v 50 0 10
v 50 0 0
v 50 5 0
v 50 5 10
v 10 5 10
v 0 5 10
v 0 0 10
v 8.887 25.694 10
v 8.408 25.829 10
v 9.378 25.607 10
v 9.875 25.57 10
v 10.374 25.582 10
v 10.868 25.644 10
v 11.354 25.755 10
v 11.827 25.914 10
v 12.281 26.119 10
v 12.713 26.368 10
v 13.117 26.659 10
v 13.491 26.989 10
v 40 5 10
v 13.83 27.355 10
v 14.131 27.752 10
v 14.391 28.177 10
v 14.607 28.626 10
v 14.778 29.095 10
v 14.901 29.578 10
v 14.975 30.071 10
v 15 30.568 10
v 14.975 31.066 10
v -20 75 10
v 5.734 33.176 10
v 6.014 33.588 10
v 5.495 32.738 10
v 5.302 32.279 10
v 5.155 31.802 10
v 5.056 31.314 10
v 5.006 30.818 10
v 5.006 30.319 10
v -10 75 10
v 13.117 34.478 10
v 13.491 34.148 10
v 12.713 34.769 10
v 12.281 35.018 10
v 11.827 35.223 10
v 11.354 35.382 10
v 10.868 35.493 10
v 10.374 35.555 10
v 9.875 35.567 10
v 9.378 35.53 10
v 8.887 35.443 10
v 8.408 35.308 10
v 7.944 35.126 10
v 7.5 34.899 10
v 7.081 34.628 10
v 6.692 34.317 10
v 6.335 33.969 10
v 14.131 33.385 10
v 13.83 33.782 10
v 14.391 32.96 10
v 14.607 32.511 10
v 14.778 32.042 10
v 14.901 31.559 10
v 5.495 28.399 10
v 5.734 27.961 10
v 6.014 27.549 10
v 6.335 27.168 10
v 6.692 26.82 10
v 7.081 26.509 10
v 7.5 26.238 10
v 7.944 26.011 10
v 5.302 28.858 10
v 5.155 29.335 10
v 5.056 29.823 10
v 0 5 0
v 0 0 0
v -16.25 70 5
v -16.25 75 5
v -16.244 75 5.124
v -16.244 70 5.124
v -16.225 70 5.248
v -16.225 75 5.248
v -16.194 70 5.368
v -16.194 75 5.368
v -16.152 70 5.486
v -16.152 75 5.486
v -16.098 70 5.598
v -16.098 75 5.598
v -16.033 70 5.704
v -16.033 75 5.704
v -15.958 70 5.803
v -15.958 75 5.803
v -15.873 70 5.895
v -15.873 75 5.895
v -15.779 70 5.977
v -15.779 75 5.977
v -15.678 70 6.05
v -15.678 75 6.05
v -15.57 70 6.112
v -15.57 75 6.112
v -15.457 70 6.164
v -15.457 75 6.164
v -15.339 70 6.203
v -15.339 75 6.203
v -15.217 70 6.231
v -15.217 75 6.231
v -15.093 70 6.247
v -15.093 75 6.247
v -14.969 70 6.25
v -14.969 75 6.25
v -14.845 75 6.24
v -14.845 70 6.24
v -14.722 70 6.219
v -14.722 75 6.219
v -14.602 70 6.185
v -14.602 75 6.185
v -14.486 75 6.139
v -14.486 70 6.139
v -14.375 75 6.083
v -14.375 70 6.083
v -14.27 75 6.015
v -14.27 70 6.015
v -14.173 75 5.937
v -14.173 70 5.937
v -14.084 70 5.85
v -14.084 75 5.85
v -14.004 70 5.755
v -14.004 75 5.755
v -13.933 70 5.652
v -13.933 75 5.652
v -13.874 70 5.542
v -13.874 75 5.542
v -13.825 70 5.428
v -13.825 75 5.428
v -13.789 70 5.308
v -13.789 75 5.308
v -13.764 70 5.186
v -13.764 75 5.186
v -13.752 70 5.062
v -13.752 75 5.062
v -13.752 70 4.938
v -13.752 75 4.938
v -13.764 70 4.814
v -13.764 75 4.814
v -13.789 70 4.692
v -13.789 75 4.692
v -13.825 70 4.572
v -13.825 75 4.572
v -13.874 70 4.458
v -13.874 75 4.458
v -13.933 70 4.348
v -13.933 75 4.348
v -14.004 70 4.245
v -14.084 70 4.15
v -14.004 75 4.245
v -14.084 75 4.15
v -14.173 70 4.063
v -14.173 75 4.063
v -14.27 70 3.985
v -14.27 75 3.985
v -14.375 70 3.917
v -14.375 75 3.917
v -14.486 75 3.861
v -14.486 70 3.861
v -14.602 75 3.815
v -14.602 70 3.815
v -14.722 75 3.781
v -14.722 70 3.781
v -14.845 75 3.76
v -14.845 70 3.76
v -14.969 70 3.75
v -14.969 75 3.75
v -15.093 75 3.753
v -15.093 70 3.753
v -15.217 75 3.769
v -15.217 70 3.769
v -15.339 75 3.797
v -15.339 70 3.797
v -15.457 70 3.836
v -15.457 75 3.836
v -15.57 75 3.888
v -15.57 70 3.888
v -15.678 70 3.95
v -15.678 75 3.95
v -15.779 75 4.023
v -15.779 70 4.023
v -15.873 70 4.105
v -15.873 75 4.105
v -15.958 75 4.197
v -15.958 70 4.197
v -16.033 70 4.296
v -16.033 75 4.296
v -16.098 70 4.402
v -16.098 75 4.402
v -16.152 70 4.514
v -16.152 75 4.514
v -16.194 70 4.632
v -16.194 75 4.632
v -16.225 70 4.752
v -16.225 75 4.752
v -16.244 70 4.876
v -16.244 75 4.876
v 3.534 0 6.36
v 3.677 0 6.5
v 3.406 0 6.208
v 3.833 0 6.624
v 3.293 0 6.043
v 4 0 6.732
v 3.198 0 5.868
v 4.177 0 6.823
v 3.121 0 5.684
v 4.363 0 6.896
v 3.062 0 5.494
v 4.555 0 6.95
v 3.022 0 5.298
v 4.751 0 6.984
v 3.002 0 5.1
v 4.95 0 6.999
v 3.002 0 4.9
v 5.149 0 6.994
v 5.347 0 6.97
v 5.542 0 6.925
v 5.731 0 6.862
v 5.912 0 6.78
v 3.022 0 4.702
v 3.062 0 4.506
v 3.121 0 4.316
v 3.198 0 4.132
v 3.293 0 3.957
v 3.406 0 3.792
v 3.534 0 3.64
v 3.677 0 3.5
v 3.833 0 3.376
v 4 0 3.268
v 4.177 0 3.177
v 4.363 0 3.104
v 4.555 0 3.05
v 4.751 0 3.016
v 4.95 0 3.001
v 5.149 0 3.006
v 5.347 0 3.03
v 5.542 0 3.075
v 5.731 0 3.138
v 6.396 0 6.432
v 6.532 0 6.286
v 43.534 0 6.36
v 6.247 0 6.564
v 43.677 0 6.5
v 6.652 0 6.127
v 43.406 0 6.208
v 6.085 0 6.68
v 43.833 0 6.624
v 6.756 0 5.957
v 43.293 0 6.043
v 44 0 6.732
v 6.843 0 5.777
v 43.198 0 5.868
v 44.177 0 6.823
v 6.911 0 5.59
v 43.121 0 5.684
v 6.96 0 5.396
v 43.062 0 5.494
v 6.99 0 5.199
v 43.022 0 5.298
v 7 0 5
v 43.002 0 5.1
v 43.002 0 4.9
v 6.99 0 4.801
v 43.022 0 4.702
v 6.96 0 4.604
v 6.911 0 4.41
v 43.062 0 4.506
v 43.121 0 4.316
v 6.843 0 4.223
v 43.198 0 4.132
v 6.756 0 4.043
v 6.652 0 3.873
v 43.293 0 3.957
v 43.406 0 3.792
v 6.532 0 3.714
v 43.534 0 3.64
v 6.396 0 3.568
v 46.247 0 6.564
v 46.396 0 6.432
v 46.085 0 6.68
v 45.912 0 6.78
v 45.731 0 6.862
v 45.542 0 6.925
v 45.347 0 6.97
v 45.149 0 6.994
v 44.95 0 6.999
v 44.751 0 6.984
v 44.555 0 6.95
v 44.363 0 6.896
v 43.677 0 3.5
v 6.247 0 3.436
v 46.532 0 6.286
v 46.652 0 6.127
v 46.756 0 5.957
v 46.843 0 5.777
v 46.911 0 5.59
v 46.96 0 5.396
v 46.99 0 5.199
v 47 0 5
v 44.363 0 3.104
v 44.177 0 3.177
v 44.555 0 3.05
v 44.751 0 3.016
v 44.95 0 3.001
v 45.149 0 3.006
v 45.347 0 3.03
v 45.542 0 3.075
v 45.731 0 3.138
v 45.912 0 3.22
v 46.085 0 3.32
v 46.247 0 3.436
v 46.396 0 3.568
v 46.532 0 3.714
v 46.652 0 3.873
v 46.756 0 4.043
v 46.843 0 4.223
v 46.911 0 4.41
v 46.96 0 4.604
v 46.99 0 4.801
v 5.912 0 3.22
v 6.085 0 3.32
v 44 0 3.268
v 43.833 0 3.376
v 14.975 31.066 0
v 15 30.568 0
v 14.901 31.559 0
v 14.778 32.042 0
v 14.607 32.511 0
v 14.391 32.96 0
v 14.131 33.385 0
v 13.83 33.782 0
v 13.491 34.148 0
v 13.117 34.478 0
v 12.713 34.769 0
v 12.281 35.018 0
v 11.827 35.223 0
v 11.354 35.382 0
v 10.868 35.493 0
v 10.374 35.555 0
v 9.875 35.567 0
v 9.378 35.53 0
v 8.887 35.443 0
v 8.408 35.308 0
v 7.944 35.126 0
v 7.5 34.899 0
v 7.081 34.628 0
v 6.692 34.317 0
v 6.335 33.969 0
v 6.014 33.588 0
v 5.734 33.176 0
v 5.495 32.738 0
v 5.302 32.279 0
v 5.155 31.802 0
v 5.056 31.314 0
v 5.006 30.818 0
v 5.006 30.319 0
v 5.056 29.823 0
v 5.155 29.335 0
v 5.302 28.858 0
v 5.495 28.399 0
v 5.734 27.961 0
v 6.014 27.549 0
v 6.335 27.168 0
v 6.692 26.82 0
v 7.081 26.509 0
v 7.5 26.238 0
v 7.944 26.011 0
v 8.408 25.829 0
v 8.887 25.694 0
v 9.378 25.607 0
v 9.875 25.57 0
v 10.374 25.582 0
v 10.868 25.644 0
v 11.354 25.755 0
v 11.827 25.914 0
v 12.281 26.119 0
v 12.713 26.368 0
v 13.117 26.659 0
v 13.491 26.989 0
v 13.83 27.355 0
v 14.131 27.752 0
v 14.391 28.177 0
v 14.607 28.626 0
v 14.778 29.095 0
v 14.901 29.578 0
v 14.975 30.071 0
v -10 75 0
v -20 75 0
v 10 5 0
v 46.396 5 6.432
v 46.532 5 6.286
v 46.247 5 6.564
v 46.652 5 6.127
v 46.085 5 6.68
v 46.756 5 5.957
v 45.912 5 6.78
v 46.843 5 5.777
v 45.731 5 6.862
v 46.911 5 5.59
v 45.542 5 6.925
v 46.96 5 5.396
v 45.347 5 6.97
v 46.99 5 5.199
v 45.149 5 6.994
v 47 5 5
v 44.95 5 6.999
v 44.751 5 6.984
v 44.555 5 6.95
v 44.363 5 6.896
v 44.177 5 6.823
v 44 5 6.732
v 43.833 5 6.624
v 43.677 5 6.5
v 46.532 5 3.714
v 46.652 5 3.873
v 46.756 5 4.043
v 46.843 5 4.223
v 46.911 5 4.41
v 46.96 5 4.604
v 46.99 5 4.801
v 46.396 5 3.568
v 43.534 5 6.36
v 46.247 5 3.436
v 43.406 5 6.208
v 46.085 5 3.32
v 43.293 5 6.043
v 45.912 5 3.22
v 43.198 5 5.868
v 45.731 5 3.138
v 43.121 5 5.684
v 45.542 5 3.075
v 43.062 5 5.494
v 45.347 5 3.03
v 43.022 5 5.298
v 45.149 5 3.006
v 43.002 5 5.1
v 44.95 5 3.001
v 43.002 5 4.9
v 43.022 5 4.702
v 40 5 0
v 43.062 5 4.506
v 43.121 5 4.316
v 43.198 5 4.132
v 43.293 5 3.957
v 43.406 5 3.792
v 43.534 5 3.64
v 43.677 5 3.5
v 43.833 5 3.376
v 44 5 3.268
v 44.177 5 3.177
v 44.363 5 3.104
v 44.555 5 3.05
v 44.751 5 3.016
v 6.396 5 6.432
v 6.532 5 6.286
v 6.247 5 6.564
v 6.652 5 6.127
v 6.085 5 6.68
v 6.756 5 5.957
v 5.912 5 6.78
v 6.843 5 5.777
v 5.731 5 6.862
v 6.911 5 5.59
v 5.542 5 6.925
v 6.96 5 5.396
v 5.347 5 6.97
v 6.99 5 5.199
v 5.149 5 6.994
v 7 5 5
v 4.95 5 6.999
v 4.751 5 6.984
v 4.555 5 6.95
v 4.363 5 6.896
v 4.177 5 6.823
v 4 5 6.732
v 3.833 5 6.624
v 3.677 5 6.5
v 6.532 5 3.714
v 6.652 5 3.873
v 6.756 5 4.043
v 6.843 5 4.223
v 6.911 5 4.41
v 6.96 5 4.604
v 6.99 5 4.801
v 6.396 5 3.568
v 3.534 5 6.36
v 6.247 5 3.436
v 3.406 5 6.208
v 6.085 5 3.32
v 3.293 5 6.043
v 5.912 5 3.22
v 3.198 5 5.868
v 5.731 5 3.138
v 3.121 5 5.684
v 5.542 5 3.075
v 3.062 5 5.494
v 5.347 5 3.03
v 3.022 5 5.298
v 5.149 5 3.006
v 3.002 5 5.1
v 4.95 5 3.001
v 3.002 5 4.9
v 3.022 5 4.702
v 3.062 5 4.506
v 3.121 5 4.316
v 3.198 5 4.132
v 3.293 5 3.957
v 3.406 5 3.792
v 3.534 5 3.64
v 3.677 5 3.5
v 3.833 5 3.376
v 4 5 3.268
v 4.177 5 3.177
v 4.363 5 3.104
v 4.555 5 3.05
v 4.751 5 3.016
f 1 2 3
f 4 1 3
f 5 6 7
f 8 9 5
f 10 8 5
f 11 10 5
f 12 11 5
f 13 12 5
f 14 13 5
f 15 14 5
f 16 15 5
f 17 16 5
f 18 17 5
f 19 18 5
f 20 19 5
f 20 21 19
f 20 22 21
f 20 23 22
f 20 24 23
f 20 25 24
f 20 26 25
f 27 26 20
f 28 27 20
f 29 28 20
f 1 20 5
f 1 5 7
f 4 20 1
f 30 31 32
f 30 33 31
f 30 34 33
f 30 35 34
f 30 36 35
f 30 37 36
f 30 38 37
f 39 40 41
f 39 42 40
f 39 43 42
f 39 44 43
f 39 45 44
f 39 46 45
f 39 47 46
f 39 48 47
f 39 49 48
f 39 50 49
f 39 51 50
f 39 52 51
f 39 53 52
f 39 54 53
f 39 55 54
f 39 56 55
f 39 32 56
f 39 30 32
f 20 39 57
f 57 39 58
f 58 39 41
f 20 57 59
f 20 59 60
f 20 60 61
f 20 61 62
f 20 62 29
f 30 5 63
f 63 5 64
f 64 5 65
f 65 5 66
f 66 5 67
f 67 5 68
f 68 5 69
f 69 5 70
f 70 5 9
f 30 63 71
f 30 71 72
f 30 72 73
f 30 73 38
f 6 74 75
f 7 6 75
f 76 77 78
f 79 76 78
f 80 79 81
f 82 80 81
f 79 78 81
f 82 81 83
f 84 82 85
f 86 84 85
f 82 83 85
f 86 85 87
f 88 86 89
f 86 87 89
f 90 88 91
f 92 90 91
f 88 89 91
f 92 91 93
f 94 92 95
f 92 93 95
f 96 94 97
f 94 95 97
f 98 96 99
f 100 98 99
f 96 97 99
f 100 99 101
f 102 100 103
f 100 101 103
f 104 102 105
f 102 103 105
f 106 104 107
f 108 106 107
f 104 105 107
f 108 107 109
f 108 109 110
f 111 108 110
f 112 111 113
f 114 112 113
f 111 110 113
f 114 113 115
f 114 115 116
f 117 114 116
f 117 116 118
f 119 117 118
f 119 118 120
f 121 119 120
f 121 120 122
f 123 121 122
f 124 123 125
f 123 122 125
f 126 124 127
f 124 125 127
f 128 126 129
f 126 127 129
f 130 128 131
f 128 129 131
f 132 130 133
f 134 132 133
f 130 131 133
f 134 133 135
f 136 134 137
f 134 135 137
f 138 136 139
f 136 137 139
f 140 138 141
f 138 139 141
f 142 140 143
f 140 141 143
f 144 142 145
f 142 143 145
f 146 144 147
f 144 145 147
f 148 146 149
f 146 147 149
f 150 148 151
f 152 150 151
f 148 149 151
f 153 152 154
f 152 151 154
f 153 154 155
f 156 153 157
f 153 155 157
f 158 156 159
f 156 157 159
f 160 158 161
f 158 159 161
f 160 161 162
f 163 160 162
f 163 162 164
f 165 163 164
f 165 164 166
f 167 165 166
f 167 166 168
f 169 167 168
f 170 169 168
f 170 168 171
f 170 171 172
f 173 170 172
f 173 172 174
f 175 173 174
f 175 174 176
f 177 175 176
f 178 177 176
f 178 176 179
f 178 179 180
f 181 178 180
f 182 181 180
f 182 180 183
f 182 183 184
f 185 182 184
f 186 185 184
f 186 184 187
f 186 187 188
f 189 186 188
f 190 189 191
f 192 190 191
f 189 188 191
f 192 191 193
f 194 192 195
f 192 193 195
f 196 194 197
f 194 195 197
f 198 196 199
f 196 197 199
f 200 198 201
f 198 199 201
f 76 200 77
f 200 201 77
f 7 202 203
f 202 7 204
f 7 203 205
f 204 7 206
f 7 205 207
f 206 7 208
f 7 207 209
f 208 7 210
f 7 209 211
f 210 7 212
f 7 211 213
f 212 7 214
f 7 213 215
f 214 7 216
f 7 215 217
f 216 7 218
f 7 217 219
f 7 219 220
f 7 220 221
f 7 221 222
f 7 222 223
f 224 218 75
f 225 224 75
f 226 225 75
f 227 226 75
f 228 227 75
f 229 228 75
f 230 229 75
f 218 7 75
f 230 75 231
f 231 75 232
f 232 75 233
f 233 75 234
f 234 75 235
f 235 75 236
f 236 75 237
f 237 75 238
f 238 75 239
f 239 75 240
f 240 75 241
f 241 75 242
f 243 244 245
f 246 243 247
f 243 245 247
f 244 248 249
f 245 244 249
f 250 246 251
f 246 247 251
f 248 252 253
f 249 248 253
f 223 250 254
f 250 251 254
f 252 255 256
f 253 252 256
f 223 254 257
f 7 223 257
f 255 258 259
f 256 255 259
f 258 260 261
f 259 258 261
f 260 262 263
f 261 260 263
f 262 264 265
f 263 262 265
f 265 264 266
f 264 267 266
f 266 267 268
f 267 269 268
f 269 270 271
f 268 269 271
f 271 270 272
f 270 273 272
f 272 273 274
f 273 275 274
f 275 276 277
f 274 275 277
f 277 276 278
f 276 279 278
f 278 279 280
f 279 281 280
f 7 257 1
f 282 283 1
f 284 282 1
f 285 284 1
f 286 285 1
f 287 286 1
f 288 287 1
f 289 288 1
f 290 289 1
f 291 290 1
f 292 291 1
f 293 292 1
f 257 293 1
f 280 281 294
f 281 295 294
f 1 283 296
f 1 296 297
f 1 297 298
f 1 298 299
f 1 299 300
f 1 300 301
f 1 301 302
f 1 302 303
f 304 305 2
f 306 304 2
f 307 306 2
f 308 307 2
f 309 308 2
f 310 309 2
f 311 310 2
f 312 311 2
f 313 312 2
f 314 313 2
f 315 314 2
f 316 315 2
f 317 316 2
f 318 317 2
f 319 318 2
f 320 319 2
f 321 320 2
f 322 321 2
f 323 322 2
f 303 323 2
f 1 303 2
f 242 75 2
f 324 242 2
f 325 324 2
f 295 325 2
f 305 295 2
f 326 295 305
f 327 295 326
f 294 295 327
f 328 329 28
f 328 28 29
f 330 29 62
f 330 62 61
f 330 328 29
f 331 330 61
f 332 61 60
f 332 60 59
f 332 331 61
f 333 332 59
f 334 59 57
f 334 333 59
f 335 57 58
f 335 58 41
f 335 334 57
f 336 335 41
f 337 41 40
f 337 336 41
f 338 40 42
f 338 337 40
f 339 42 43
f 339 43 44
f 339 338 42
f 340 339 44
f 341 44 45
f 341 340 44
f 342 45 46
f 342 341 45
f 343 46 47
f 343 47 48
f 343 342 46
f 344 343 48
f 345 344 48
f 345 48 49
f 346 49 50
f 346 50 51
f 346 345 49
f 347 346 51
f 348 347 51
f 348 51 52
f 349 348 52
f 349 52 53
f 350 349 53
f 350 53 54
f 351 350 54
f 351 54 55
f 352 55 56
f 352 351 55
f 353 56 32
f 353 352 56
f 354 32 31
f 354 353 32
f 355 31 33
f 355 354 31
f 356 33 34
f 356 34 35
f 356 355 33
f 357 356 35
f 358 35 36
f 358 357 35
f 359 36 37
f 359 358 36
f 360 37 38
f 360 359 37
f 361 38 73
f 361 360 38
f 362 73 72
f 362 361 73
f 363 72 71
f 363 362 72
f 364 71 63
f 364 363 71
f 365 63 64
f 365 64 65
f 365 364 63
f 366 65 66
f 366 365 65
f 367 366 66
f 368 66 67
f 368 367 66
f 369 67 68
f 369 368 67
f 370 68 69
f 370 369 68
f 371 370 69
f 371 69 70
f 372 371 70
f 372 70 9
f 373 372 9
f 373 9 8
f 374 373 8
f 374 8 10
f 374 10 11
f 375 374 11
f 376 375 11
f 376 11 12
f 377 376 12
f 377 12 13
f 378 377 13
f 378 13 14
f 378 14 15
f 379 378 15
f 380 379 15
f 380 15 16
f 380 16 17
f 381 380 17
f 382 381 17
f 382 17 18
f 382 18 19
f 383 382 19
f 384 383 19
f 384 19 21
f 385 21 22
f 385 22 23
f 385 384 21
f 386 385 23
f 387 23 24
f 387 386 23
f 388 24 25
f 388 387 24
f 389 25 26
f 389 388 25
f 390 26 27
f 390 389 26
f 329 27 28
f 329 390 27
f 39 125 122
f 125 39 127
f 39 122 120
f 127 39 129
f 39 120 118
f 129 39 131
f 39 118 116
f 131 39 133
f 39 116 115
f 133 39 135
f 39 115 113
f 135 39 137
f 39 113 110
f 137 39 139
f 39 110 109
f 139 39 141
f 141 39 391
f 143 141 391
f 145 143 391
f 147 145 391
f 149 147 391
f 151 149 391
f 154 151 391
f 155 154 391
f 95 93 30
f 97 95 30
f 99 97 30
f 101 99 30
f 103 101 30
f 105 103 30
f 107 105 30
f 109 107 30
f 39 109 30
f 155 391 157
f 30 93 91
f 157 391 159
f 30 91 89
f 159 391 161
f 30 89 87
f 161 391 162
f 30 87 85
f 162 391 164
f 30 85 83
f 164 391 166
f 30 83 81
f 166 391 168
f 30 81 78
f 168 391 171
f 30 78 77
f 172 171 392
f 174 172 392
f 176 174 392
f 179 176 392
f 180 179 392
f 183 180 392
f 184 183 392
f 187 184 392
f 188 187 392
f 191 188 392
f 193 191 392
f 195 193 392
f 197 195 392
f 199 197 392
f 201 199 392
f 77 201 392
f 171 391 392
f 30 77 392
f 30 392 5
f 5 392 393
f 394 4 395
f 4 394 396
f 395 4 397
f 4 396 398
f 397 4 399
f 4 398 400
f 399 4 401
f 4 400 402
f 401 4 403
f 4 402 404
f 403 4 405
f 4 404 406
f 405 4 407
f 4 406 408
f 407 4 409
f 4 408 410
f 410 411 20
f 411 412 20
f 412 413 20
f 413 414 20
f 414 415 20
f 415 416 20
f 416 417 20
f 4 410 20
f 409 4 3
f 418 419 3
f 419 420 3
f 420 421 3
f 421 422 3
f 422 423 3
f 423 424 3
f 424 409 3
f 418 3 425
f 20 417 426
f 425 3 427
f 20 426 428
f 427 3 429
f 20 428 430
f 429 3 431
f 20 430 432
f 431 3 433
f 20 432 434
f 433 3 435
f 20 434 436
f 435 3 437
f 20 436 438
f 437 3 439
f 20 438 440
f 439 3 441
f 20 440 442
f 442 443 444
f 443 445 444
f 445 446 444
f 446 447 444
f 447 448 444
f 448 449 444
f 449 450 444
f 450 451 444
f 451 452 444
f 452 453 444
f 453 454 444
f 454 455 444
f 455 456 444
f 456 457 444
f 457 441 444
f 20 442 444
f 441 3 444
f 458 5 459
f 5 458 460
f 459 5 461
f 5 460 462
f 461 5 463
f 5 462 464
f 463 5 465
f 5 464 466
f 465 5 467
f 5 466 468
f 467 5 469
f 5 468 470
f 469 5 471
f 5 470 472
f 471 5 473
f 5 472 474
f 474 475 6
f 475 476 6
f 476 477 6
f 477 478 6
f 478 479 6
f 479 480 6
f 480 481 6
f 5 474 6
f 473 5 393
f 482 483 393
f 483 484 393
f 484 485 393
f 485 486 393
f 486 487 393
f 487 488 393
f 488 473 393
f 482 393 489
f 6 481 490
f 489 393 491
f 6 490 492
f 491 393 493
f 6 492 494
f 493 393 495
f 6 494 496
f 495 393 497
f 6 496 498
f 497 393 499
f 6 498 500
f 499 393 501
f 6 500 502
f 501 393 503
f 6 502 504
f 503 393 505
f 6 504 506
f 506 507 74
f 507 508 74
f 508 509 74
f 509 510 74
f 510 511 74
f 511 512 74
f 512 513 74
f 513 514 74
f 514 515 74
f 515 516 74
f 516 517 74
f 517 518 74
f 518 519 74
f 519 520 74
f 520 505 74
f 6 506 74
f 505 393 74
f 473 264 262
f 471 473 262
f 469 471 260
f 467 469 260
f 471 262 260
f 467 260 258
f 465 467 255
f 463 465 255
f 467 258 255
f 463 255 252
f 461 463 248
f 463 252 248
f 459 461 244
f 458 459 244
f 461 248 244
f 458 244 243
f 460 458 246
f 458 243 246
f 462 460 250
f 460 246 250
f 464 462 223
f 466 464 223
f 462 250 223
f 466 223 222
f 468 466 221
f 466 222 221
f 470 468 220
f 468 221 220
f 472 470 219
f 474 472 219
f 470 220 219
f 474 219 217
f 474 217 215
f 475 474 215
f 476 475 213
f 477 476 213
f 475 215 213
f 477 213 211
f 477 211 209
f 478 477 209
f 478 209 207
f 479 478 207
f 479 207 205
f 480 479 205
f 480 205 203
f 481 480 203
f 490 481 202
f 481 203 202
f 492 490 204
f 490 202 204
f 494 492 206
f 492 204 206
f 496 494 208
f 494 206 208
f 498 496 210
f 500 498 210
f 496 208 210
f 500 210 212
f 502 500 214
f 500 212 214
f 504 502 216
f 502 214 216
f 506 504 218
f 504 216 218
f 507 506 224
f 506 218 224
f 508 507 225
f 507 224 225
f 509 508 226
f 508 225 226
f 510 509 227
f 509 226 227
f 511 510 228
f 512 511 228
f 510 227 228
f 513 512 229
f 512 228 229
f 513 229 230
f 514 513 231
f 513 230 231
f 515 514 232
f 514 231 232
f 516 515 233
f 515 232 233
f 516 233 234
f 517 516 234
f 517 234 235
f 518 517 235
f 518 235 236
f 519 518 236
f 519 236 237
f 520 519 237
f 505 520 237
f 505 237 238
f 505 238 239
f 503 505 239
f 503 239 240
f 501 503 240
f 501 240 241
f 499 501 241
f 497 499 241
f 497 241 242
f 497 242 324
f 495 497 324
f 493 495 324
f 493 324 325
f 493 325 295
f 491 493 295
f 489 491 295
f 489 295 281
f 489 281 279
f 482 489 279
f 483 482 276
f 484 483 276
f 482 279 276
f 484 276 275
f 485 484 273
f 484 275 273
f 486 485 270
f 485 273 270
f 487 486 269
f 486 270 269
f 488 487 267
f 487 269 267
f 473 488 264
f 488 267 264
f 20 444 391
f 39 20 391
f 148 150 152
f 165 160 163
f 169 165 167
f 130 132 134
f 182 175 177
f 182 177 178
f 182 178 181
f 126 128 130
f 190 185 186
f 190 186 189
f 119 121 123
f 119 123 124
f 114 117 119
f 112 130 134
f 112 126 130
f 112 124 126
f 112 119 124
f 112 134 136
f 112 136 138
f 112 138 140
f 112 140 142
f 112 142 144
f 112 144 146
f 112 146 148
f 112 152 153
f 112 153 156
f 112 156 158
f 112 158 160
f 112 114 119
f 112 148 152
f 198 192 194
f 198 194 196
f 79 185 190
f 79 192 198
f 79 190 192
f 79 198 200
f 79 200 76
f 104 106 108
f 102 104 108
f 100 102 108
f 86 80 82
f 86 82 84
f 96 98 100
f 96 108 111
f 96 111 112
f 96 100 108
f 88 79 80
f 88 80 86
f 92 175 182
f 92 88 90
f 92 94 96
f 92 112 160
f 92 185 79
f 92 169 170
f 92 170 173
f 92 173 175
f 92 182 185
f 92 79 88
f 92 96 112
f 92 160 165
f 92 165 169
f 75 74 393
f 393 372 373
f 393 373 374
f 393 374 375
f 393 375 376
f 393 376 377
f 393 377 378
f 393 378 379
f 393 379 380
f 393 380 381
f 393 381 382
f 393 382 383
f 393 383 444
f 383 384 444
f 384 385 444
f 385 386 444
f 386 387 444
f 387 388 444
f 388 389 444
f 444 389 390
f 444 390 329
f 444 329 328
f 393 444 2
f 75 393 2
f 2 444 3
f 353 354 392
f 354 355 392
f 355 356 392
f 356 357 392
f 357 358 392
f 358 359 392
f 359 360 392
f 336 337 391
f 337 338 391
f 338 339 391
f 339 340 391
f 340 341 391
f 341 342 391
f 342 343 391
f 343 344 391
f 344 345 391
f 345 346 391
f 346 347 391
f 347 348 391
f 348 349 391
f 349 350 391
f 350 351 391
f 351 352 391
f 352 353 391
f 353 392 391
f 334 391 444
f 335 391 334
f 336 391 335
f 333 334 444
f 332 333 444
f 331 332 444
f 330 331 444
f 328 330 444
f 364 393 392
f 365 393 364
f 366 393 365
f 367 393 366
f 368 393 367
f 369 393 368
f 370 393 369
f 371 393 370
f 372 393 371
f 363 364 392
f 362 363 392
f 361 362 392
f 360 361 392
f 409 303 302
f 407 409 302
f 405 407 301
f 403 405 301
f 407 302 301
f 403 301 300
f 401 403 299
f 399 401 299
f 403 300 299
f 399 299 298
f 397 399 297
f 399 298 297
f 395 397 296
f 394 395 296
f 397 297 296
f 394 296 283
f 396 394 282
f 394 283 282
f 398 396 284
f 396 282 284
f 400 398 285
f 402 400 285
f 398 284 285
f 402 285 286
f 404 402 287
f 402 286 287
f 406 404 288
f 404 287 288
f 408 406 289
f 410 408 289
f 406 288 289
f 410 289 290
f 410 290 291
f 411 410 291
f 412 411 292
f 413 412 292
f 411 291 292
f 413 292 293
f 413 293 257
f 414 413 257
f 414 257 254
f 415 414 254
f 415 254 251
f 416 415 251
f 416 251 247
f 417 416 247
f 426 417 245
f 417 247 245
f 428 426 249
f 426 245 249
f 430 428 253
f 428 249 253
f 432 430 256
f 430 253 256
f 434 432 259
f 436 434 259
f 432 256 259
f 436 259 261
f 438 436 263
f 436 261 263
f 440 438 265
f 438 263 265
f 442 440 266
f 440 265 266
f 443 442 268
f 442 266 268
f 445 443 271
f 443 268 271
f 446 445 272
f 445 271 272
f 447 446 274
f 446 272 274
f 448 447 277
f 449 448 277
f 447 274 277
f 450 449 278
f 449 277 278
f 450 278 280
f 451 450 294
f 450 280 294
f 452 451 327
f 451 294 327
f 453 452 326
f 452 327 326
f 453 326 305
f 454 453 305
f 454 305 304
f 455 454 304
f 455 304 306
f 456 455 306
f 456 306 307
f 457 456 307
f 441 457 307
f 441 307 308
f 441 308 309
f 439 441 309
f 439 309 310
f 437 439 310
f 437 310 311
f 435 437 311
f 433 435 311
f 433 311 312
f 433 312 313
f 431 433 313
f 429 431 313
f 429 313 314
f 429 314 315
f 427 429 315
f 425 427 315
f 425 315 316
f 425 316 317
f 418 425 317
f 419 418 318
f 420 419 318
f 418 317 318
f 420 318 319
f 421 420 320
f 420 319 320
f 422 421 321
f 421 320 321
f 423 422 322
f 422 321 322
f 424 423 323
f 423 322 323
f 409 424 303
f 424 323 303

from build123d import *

# Parameters (mm, degrees)
F0_R     = 5
F1_DEPTH = 10
F2_R     = 2
F3_DEPTH = 5
F4_R     = 1.25
F5_DEPTH = 5


with BuildPart() as f1:
    # F0 (on Top) → F1 (new body)
    with BuildSketch(Plane.XY):
        Polygon((0, 5), (0, 0), (50, 0), (50, 5), (40, 5), (-10, 75), (-20, 75), (10, 5), align=None)
        with Locations((10, 30.5684879422)):
            Circle(F0_R, mode=Mode.SUBTRACT)
    extrude(amount=F1_DEPTH)

    # F2 (on face) → F3 (cut)
    with BuildSketch(Plane.XZ):
        with Locations((45, 5)):
            Circle(F2_R)
        with Locations((5, 5)):
            Circle(F2_R)
    extrude(amount=-F3_DEPTH, mode=Mode.SUBTRACT)

    # F4 (on face) → F5 (cut)
    with BuildSketch(Plane(origin=(0, 75, 0), x_dir=(-1, 0, 0), z_dir=(0, 1, 0))):
        with Locations((15, 5)):
            Circle(F4_R)
    extrude(amount=-F5_DEPTH, mode=Mode.SUBTRACT)


solid = f1.part
